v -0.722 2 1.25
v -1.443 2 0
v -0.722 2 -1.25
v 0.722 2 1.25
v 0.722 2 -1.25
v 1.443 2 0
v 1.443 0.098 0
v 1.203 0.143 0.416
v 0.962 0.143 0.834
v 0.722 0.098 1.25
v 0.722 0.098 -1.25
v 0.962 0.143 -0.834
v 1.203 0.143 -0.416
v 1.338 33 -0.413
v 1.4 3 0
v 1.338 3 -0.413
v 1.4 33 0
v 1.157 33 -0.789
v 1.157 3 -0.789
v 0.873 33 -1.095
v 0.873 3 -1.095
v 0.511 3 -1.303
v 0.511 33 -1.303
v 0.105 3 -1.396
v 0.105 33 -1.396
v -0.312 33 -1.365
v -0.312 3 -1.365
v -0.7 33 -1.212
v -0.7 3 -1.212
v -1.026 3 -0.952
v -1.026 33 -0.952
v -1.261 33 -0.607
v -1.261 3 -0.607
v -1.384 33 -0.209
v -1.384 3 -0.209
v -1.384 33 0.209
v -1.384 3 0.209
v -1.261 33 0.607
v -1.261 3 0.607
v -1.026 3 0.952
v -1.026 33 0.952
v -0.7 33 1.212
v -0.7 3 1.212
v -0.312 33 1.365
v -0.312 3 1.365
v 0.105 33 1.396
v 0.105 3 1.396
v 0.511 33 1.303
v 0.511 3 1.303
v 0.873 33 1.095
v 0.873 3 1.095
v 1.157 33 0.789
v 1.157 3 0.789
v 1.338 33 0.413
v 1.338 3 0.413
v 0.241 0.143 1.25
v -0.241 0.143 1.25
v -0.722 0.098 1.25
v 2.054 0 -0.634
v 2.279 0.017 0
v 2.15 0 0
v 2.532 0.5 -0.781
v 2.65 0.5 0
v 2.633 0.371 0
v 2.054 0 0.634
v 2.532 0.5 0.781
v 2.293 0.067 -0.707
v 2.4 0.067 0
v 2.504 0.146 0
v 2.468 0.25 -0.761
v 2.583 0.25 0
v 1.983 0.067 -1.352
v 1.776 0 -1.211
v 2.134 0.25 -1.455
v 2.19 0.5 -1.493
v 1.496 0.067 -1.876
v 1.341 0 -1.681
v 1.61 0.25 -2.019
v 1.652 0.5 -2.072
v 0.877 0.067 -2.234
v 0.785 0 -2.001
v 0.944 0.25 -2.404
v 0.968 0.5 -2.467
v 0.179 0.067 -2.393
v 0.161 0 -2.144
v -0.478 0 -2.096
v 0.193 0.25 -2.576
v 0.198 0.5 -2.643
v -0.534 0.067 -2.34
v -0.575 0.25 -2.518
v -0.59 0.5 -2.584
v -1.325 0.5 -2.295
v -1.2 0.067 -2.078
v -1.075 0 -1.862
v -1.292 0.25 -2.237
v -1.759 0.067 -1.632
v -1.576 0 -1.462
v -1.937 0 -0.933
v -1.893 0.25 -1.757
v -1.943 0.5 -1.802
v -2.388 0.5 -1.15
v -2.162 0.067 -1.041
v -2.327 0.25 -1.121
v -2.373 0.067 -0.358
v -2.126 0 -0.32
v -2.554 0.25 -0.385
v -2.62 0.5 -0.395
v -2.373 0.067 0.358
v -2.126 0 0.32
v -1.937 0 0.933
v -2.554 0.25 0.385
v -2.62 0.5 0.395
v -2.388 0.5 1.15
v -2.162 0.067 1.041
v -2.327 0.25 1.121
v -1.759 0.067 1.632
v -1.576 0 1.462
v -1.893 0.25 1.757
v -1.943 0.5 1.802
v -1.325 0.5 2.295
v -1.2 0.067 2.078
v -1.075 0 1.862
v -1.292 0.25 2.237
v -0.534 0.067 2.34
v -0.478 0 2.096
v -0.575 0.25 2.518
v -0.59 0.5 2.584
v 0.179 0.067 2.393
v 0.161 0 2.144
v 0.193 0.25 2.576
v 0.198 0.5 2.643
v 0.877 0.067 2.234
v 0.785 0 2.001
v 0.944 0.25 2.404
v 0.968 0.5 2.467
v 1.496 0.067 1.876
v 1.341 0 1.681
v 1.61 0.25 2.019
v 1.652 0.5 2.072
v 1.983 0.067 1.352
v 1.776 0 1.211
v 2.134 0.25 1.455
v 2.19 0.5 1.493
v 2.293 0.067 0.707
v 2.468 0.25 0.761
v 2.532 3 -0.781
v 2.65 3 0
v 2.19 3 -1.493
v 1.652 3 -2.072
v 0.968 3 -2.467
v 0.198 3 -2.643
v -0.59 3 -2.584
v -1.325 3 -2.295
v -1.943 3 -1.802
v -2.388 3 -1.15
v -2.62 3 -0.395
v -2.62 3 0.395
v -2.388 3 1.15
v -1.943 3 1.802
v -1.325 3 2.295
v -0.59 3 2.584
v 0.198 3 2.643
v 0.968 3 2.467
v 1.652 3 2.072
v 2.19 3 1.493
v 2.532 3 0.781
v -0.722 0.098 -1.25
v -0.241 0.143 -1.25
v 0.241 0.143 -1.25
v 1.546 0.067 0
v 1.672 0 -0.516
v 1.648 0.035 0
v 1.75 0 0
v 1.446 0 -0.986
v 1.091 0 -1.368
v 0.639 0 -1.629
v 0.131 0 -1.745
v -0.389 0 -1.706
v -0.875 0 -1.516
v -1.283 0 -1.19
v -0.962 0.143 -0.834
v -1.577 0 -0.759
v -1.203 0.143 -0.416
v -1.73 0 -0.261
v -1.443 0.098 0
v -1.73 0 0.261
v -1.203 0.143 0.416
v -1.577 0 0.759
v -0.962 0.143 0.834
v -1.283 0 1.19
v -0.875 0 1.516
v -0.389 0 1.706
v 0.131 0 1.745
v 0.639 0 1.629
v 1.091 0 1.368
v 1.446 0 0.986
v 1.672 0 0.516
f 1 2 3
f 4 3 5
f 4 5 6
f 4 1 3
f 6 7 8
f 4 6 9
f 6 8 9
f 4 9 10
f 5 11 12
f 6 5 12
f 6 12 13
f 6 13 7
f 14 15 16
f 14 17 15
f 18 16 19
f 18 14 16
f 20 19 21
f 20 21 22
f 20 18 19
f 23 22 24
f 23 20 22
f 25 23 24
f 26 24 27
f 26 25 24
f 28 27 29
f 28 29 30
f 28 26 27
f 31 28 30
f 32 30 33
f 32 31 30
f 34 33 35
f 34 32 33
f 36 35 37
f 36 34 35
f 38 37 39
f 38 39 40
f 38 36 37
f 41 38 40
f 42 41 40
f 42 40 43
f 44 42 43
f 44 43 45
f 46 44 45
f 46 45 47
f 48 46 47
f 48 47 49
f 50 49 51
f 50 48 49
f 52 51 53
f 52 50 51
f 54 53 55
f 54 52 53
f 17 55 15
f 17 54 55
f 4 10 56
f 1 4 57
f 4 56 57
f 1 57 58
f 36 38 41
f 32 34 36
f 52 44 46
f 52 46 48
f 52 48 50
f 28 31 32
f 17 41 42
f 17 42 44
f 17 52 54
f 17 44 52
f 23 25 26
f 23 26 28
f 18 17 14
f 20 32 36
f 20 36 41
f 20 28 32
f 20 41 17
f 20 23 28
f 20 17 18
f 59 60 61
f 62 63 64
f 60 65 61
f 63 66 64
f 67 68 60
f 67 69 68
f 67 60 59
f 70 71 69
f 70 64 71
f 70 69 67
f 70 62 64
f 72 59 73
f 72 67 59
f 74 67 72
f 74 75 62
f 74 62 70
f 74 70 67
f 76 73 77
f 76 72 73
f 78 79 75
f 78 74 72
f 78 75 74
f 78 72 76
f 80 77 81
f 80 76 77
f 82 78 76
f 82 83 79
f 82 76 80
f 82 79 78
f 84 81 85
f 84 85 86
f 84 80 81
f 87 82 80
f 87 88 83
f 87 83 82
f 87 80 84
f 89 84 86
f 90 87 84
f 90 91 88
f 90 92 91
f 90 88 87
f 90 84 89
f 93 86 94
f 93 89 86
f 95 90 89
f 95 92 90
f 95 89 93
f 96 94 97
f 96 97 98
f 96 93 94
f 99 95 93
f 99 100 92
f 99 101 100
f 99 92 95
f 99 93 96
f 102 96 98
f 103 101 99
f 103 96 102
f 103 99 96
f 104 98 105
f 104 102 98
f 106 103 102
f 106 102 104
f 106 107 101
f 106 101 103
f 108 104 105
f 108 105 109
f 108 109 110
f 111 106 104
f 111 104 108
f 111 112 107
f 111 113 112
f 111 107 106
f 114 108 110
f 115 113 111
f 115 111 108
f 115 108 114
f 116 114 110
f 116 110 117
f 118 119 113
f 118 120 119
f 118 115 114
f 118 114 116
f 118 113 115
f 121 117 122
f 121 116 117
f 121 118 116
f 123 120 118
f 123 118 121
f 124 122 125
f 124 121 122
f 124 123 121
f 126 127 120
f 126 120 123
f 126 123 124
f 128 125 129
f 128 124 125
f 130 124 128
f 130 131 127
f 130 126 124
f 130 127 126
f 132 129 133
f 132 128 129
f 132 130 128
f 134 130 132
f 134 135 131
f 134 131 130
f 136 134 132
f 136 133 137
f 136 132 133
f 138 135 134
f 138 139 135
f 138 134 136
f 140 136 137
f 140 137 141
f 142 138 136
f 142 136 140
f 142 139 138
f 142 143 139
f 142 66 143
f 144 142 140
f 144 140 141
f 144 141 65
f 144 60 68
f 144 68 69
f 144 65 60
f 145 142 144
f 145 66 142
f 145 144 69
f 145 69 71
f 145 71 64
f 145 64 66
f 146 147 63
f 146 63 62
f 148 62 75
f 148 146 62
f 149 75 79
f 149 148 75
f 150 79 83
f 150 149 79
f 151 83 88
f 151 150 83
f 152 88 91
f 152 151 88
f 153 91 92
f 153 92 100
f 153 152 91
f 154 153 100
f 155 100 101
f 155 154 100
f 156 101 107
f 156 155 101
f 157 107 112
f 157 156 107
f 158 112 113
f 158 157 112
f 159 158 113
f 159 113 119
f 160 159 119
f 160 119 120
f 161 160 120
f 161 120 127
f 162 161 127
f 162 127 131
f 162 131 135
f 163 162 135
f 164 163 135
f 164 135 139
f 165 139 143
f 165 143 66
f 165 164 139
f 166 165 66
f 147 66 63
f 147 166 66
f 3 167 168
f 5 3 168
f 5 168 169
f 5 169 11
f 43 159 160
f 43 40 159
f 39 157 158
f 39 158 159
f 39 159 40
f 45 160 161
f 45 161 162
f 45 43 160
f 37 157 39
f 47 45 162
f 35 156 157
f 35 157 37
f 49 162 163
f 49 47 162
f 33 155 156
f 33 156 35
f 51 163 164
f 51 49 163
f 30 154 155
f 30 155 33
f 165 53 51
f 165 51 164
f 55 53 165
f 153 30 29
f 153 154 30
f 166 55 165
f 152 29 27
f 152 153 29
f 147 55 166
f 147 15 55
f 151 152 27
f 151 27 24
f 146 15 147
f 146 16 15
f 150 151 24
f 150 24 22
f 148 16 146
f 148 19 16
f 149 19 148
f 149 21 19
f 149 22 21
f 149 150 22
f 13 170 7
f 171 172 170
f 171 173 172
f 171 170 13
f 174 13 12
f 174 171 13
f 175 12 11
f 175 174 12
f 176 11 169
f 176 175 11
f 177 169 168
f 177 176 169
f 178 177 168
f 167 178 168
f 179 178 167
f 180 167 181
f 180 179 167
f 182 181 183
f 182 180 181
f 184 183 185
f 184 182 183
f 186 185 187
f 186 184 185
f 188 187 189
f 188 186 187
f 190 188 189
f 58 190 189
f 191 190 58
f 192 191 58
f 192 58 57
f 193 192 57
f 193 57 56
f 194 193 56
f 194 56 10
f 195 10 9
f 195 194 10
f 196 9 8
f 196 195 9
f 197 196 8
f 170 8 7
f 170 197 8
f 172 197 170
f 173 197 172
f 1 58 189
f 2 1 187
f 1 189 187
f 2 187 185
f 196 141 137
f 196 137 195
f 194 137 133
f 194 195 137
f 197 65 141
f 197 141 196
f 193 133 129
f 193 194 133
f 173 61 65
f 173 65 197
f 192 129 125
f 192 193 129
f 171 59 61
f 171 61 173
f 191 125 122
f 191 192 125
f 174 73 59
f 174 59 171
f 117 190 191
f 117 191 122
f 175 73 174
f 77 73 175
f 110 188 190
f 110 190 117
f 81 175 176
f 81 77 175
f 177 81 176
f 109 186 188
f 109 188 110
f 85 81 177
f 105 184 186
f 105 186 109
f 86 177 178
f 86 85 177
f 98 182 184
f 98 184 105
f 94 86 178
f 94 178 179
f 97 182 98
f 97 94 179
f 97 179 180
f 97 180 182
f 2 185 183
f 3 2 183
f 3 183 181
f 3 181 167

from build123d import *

# Parameters (mm, degrees)
CUT_EXTRUDE1_DEPTH = 2
FILLET1_R          = 0.5


with BuildPart() as part:
    # Sketch2 → Revolve1 (revolve)
    with BuildSketch(Plane.XY):
        Polygon((0, 0), (2.65, 0), (2.65, 3), (1.4, 3), (1.4, 33), (0, 33), align=None)
    revolve(axis=Axis((0, 0, 0), (0, 1, 0)))

    # Sketch3 → Cut-Extrude1 (cut)
    with BuildSketch(Plane.XZ):
        Polygon((-1.443375673, 0), (-0.721687836, -1.25), (0.721687836, -1.25), (1.443375673, 0), (0.721687836, 1.25), (-0.721687836, 1.25), align=None)
    extrude(amount=-CUT_EXTRUDE1_DEPTH, mode=Mode.SUBTRACT)

    # Sketch4 → Cut-Revolve1 (revolve, cut)
    with BuildSketch(Plane(origin=(0, 0, 0), x_dir=(-1, 0, 0), z_dir=(0, 0, -1))):
        with BuildLine():
            Line((0, 0), (0, 0.3))
            ThreePointArc((0, 0.3), (-0.887764045, 0.22445693), (-1.75, 0))
            Line((-1.75, 0), (0, 0))
        make_face()
    revolve(axis=Axis((0, 0, 0), (0, 1, 0)), mode=Mode.SUBTRACT)

    # Fillet1
    fillet1_edges = [part.edges().sort_by_distance(p)[0] for p in [
        (-2.65, 0, 0),
    ]]
    fillet(fillet1_edges, radius=FILLET1_R)


solid = part.part
